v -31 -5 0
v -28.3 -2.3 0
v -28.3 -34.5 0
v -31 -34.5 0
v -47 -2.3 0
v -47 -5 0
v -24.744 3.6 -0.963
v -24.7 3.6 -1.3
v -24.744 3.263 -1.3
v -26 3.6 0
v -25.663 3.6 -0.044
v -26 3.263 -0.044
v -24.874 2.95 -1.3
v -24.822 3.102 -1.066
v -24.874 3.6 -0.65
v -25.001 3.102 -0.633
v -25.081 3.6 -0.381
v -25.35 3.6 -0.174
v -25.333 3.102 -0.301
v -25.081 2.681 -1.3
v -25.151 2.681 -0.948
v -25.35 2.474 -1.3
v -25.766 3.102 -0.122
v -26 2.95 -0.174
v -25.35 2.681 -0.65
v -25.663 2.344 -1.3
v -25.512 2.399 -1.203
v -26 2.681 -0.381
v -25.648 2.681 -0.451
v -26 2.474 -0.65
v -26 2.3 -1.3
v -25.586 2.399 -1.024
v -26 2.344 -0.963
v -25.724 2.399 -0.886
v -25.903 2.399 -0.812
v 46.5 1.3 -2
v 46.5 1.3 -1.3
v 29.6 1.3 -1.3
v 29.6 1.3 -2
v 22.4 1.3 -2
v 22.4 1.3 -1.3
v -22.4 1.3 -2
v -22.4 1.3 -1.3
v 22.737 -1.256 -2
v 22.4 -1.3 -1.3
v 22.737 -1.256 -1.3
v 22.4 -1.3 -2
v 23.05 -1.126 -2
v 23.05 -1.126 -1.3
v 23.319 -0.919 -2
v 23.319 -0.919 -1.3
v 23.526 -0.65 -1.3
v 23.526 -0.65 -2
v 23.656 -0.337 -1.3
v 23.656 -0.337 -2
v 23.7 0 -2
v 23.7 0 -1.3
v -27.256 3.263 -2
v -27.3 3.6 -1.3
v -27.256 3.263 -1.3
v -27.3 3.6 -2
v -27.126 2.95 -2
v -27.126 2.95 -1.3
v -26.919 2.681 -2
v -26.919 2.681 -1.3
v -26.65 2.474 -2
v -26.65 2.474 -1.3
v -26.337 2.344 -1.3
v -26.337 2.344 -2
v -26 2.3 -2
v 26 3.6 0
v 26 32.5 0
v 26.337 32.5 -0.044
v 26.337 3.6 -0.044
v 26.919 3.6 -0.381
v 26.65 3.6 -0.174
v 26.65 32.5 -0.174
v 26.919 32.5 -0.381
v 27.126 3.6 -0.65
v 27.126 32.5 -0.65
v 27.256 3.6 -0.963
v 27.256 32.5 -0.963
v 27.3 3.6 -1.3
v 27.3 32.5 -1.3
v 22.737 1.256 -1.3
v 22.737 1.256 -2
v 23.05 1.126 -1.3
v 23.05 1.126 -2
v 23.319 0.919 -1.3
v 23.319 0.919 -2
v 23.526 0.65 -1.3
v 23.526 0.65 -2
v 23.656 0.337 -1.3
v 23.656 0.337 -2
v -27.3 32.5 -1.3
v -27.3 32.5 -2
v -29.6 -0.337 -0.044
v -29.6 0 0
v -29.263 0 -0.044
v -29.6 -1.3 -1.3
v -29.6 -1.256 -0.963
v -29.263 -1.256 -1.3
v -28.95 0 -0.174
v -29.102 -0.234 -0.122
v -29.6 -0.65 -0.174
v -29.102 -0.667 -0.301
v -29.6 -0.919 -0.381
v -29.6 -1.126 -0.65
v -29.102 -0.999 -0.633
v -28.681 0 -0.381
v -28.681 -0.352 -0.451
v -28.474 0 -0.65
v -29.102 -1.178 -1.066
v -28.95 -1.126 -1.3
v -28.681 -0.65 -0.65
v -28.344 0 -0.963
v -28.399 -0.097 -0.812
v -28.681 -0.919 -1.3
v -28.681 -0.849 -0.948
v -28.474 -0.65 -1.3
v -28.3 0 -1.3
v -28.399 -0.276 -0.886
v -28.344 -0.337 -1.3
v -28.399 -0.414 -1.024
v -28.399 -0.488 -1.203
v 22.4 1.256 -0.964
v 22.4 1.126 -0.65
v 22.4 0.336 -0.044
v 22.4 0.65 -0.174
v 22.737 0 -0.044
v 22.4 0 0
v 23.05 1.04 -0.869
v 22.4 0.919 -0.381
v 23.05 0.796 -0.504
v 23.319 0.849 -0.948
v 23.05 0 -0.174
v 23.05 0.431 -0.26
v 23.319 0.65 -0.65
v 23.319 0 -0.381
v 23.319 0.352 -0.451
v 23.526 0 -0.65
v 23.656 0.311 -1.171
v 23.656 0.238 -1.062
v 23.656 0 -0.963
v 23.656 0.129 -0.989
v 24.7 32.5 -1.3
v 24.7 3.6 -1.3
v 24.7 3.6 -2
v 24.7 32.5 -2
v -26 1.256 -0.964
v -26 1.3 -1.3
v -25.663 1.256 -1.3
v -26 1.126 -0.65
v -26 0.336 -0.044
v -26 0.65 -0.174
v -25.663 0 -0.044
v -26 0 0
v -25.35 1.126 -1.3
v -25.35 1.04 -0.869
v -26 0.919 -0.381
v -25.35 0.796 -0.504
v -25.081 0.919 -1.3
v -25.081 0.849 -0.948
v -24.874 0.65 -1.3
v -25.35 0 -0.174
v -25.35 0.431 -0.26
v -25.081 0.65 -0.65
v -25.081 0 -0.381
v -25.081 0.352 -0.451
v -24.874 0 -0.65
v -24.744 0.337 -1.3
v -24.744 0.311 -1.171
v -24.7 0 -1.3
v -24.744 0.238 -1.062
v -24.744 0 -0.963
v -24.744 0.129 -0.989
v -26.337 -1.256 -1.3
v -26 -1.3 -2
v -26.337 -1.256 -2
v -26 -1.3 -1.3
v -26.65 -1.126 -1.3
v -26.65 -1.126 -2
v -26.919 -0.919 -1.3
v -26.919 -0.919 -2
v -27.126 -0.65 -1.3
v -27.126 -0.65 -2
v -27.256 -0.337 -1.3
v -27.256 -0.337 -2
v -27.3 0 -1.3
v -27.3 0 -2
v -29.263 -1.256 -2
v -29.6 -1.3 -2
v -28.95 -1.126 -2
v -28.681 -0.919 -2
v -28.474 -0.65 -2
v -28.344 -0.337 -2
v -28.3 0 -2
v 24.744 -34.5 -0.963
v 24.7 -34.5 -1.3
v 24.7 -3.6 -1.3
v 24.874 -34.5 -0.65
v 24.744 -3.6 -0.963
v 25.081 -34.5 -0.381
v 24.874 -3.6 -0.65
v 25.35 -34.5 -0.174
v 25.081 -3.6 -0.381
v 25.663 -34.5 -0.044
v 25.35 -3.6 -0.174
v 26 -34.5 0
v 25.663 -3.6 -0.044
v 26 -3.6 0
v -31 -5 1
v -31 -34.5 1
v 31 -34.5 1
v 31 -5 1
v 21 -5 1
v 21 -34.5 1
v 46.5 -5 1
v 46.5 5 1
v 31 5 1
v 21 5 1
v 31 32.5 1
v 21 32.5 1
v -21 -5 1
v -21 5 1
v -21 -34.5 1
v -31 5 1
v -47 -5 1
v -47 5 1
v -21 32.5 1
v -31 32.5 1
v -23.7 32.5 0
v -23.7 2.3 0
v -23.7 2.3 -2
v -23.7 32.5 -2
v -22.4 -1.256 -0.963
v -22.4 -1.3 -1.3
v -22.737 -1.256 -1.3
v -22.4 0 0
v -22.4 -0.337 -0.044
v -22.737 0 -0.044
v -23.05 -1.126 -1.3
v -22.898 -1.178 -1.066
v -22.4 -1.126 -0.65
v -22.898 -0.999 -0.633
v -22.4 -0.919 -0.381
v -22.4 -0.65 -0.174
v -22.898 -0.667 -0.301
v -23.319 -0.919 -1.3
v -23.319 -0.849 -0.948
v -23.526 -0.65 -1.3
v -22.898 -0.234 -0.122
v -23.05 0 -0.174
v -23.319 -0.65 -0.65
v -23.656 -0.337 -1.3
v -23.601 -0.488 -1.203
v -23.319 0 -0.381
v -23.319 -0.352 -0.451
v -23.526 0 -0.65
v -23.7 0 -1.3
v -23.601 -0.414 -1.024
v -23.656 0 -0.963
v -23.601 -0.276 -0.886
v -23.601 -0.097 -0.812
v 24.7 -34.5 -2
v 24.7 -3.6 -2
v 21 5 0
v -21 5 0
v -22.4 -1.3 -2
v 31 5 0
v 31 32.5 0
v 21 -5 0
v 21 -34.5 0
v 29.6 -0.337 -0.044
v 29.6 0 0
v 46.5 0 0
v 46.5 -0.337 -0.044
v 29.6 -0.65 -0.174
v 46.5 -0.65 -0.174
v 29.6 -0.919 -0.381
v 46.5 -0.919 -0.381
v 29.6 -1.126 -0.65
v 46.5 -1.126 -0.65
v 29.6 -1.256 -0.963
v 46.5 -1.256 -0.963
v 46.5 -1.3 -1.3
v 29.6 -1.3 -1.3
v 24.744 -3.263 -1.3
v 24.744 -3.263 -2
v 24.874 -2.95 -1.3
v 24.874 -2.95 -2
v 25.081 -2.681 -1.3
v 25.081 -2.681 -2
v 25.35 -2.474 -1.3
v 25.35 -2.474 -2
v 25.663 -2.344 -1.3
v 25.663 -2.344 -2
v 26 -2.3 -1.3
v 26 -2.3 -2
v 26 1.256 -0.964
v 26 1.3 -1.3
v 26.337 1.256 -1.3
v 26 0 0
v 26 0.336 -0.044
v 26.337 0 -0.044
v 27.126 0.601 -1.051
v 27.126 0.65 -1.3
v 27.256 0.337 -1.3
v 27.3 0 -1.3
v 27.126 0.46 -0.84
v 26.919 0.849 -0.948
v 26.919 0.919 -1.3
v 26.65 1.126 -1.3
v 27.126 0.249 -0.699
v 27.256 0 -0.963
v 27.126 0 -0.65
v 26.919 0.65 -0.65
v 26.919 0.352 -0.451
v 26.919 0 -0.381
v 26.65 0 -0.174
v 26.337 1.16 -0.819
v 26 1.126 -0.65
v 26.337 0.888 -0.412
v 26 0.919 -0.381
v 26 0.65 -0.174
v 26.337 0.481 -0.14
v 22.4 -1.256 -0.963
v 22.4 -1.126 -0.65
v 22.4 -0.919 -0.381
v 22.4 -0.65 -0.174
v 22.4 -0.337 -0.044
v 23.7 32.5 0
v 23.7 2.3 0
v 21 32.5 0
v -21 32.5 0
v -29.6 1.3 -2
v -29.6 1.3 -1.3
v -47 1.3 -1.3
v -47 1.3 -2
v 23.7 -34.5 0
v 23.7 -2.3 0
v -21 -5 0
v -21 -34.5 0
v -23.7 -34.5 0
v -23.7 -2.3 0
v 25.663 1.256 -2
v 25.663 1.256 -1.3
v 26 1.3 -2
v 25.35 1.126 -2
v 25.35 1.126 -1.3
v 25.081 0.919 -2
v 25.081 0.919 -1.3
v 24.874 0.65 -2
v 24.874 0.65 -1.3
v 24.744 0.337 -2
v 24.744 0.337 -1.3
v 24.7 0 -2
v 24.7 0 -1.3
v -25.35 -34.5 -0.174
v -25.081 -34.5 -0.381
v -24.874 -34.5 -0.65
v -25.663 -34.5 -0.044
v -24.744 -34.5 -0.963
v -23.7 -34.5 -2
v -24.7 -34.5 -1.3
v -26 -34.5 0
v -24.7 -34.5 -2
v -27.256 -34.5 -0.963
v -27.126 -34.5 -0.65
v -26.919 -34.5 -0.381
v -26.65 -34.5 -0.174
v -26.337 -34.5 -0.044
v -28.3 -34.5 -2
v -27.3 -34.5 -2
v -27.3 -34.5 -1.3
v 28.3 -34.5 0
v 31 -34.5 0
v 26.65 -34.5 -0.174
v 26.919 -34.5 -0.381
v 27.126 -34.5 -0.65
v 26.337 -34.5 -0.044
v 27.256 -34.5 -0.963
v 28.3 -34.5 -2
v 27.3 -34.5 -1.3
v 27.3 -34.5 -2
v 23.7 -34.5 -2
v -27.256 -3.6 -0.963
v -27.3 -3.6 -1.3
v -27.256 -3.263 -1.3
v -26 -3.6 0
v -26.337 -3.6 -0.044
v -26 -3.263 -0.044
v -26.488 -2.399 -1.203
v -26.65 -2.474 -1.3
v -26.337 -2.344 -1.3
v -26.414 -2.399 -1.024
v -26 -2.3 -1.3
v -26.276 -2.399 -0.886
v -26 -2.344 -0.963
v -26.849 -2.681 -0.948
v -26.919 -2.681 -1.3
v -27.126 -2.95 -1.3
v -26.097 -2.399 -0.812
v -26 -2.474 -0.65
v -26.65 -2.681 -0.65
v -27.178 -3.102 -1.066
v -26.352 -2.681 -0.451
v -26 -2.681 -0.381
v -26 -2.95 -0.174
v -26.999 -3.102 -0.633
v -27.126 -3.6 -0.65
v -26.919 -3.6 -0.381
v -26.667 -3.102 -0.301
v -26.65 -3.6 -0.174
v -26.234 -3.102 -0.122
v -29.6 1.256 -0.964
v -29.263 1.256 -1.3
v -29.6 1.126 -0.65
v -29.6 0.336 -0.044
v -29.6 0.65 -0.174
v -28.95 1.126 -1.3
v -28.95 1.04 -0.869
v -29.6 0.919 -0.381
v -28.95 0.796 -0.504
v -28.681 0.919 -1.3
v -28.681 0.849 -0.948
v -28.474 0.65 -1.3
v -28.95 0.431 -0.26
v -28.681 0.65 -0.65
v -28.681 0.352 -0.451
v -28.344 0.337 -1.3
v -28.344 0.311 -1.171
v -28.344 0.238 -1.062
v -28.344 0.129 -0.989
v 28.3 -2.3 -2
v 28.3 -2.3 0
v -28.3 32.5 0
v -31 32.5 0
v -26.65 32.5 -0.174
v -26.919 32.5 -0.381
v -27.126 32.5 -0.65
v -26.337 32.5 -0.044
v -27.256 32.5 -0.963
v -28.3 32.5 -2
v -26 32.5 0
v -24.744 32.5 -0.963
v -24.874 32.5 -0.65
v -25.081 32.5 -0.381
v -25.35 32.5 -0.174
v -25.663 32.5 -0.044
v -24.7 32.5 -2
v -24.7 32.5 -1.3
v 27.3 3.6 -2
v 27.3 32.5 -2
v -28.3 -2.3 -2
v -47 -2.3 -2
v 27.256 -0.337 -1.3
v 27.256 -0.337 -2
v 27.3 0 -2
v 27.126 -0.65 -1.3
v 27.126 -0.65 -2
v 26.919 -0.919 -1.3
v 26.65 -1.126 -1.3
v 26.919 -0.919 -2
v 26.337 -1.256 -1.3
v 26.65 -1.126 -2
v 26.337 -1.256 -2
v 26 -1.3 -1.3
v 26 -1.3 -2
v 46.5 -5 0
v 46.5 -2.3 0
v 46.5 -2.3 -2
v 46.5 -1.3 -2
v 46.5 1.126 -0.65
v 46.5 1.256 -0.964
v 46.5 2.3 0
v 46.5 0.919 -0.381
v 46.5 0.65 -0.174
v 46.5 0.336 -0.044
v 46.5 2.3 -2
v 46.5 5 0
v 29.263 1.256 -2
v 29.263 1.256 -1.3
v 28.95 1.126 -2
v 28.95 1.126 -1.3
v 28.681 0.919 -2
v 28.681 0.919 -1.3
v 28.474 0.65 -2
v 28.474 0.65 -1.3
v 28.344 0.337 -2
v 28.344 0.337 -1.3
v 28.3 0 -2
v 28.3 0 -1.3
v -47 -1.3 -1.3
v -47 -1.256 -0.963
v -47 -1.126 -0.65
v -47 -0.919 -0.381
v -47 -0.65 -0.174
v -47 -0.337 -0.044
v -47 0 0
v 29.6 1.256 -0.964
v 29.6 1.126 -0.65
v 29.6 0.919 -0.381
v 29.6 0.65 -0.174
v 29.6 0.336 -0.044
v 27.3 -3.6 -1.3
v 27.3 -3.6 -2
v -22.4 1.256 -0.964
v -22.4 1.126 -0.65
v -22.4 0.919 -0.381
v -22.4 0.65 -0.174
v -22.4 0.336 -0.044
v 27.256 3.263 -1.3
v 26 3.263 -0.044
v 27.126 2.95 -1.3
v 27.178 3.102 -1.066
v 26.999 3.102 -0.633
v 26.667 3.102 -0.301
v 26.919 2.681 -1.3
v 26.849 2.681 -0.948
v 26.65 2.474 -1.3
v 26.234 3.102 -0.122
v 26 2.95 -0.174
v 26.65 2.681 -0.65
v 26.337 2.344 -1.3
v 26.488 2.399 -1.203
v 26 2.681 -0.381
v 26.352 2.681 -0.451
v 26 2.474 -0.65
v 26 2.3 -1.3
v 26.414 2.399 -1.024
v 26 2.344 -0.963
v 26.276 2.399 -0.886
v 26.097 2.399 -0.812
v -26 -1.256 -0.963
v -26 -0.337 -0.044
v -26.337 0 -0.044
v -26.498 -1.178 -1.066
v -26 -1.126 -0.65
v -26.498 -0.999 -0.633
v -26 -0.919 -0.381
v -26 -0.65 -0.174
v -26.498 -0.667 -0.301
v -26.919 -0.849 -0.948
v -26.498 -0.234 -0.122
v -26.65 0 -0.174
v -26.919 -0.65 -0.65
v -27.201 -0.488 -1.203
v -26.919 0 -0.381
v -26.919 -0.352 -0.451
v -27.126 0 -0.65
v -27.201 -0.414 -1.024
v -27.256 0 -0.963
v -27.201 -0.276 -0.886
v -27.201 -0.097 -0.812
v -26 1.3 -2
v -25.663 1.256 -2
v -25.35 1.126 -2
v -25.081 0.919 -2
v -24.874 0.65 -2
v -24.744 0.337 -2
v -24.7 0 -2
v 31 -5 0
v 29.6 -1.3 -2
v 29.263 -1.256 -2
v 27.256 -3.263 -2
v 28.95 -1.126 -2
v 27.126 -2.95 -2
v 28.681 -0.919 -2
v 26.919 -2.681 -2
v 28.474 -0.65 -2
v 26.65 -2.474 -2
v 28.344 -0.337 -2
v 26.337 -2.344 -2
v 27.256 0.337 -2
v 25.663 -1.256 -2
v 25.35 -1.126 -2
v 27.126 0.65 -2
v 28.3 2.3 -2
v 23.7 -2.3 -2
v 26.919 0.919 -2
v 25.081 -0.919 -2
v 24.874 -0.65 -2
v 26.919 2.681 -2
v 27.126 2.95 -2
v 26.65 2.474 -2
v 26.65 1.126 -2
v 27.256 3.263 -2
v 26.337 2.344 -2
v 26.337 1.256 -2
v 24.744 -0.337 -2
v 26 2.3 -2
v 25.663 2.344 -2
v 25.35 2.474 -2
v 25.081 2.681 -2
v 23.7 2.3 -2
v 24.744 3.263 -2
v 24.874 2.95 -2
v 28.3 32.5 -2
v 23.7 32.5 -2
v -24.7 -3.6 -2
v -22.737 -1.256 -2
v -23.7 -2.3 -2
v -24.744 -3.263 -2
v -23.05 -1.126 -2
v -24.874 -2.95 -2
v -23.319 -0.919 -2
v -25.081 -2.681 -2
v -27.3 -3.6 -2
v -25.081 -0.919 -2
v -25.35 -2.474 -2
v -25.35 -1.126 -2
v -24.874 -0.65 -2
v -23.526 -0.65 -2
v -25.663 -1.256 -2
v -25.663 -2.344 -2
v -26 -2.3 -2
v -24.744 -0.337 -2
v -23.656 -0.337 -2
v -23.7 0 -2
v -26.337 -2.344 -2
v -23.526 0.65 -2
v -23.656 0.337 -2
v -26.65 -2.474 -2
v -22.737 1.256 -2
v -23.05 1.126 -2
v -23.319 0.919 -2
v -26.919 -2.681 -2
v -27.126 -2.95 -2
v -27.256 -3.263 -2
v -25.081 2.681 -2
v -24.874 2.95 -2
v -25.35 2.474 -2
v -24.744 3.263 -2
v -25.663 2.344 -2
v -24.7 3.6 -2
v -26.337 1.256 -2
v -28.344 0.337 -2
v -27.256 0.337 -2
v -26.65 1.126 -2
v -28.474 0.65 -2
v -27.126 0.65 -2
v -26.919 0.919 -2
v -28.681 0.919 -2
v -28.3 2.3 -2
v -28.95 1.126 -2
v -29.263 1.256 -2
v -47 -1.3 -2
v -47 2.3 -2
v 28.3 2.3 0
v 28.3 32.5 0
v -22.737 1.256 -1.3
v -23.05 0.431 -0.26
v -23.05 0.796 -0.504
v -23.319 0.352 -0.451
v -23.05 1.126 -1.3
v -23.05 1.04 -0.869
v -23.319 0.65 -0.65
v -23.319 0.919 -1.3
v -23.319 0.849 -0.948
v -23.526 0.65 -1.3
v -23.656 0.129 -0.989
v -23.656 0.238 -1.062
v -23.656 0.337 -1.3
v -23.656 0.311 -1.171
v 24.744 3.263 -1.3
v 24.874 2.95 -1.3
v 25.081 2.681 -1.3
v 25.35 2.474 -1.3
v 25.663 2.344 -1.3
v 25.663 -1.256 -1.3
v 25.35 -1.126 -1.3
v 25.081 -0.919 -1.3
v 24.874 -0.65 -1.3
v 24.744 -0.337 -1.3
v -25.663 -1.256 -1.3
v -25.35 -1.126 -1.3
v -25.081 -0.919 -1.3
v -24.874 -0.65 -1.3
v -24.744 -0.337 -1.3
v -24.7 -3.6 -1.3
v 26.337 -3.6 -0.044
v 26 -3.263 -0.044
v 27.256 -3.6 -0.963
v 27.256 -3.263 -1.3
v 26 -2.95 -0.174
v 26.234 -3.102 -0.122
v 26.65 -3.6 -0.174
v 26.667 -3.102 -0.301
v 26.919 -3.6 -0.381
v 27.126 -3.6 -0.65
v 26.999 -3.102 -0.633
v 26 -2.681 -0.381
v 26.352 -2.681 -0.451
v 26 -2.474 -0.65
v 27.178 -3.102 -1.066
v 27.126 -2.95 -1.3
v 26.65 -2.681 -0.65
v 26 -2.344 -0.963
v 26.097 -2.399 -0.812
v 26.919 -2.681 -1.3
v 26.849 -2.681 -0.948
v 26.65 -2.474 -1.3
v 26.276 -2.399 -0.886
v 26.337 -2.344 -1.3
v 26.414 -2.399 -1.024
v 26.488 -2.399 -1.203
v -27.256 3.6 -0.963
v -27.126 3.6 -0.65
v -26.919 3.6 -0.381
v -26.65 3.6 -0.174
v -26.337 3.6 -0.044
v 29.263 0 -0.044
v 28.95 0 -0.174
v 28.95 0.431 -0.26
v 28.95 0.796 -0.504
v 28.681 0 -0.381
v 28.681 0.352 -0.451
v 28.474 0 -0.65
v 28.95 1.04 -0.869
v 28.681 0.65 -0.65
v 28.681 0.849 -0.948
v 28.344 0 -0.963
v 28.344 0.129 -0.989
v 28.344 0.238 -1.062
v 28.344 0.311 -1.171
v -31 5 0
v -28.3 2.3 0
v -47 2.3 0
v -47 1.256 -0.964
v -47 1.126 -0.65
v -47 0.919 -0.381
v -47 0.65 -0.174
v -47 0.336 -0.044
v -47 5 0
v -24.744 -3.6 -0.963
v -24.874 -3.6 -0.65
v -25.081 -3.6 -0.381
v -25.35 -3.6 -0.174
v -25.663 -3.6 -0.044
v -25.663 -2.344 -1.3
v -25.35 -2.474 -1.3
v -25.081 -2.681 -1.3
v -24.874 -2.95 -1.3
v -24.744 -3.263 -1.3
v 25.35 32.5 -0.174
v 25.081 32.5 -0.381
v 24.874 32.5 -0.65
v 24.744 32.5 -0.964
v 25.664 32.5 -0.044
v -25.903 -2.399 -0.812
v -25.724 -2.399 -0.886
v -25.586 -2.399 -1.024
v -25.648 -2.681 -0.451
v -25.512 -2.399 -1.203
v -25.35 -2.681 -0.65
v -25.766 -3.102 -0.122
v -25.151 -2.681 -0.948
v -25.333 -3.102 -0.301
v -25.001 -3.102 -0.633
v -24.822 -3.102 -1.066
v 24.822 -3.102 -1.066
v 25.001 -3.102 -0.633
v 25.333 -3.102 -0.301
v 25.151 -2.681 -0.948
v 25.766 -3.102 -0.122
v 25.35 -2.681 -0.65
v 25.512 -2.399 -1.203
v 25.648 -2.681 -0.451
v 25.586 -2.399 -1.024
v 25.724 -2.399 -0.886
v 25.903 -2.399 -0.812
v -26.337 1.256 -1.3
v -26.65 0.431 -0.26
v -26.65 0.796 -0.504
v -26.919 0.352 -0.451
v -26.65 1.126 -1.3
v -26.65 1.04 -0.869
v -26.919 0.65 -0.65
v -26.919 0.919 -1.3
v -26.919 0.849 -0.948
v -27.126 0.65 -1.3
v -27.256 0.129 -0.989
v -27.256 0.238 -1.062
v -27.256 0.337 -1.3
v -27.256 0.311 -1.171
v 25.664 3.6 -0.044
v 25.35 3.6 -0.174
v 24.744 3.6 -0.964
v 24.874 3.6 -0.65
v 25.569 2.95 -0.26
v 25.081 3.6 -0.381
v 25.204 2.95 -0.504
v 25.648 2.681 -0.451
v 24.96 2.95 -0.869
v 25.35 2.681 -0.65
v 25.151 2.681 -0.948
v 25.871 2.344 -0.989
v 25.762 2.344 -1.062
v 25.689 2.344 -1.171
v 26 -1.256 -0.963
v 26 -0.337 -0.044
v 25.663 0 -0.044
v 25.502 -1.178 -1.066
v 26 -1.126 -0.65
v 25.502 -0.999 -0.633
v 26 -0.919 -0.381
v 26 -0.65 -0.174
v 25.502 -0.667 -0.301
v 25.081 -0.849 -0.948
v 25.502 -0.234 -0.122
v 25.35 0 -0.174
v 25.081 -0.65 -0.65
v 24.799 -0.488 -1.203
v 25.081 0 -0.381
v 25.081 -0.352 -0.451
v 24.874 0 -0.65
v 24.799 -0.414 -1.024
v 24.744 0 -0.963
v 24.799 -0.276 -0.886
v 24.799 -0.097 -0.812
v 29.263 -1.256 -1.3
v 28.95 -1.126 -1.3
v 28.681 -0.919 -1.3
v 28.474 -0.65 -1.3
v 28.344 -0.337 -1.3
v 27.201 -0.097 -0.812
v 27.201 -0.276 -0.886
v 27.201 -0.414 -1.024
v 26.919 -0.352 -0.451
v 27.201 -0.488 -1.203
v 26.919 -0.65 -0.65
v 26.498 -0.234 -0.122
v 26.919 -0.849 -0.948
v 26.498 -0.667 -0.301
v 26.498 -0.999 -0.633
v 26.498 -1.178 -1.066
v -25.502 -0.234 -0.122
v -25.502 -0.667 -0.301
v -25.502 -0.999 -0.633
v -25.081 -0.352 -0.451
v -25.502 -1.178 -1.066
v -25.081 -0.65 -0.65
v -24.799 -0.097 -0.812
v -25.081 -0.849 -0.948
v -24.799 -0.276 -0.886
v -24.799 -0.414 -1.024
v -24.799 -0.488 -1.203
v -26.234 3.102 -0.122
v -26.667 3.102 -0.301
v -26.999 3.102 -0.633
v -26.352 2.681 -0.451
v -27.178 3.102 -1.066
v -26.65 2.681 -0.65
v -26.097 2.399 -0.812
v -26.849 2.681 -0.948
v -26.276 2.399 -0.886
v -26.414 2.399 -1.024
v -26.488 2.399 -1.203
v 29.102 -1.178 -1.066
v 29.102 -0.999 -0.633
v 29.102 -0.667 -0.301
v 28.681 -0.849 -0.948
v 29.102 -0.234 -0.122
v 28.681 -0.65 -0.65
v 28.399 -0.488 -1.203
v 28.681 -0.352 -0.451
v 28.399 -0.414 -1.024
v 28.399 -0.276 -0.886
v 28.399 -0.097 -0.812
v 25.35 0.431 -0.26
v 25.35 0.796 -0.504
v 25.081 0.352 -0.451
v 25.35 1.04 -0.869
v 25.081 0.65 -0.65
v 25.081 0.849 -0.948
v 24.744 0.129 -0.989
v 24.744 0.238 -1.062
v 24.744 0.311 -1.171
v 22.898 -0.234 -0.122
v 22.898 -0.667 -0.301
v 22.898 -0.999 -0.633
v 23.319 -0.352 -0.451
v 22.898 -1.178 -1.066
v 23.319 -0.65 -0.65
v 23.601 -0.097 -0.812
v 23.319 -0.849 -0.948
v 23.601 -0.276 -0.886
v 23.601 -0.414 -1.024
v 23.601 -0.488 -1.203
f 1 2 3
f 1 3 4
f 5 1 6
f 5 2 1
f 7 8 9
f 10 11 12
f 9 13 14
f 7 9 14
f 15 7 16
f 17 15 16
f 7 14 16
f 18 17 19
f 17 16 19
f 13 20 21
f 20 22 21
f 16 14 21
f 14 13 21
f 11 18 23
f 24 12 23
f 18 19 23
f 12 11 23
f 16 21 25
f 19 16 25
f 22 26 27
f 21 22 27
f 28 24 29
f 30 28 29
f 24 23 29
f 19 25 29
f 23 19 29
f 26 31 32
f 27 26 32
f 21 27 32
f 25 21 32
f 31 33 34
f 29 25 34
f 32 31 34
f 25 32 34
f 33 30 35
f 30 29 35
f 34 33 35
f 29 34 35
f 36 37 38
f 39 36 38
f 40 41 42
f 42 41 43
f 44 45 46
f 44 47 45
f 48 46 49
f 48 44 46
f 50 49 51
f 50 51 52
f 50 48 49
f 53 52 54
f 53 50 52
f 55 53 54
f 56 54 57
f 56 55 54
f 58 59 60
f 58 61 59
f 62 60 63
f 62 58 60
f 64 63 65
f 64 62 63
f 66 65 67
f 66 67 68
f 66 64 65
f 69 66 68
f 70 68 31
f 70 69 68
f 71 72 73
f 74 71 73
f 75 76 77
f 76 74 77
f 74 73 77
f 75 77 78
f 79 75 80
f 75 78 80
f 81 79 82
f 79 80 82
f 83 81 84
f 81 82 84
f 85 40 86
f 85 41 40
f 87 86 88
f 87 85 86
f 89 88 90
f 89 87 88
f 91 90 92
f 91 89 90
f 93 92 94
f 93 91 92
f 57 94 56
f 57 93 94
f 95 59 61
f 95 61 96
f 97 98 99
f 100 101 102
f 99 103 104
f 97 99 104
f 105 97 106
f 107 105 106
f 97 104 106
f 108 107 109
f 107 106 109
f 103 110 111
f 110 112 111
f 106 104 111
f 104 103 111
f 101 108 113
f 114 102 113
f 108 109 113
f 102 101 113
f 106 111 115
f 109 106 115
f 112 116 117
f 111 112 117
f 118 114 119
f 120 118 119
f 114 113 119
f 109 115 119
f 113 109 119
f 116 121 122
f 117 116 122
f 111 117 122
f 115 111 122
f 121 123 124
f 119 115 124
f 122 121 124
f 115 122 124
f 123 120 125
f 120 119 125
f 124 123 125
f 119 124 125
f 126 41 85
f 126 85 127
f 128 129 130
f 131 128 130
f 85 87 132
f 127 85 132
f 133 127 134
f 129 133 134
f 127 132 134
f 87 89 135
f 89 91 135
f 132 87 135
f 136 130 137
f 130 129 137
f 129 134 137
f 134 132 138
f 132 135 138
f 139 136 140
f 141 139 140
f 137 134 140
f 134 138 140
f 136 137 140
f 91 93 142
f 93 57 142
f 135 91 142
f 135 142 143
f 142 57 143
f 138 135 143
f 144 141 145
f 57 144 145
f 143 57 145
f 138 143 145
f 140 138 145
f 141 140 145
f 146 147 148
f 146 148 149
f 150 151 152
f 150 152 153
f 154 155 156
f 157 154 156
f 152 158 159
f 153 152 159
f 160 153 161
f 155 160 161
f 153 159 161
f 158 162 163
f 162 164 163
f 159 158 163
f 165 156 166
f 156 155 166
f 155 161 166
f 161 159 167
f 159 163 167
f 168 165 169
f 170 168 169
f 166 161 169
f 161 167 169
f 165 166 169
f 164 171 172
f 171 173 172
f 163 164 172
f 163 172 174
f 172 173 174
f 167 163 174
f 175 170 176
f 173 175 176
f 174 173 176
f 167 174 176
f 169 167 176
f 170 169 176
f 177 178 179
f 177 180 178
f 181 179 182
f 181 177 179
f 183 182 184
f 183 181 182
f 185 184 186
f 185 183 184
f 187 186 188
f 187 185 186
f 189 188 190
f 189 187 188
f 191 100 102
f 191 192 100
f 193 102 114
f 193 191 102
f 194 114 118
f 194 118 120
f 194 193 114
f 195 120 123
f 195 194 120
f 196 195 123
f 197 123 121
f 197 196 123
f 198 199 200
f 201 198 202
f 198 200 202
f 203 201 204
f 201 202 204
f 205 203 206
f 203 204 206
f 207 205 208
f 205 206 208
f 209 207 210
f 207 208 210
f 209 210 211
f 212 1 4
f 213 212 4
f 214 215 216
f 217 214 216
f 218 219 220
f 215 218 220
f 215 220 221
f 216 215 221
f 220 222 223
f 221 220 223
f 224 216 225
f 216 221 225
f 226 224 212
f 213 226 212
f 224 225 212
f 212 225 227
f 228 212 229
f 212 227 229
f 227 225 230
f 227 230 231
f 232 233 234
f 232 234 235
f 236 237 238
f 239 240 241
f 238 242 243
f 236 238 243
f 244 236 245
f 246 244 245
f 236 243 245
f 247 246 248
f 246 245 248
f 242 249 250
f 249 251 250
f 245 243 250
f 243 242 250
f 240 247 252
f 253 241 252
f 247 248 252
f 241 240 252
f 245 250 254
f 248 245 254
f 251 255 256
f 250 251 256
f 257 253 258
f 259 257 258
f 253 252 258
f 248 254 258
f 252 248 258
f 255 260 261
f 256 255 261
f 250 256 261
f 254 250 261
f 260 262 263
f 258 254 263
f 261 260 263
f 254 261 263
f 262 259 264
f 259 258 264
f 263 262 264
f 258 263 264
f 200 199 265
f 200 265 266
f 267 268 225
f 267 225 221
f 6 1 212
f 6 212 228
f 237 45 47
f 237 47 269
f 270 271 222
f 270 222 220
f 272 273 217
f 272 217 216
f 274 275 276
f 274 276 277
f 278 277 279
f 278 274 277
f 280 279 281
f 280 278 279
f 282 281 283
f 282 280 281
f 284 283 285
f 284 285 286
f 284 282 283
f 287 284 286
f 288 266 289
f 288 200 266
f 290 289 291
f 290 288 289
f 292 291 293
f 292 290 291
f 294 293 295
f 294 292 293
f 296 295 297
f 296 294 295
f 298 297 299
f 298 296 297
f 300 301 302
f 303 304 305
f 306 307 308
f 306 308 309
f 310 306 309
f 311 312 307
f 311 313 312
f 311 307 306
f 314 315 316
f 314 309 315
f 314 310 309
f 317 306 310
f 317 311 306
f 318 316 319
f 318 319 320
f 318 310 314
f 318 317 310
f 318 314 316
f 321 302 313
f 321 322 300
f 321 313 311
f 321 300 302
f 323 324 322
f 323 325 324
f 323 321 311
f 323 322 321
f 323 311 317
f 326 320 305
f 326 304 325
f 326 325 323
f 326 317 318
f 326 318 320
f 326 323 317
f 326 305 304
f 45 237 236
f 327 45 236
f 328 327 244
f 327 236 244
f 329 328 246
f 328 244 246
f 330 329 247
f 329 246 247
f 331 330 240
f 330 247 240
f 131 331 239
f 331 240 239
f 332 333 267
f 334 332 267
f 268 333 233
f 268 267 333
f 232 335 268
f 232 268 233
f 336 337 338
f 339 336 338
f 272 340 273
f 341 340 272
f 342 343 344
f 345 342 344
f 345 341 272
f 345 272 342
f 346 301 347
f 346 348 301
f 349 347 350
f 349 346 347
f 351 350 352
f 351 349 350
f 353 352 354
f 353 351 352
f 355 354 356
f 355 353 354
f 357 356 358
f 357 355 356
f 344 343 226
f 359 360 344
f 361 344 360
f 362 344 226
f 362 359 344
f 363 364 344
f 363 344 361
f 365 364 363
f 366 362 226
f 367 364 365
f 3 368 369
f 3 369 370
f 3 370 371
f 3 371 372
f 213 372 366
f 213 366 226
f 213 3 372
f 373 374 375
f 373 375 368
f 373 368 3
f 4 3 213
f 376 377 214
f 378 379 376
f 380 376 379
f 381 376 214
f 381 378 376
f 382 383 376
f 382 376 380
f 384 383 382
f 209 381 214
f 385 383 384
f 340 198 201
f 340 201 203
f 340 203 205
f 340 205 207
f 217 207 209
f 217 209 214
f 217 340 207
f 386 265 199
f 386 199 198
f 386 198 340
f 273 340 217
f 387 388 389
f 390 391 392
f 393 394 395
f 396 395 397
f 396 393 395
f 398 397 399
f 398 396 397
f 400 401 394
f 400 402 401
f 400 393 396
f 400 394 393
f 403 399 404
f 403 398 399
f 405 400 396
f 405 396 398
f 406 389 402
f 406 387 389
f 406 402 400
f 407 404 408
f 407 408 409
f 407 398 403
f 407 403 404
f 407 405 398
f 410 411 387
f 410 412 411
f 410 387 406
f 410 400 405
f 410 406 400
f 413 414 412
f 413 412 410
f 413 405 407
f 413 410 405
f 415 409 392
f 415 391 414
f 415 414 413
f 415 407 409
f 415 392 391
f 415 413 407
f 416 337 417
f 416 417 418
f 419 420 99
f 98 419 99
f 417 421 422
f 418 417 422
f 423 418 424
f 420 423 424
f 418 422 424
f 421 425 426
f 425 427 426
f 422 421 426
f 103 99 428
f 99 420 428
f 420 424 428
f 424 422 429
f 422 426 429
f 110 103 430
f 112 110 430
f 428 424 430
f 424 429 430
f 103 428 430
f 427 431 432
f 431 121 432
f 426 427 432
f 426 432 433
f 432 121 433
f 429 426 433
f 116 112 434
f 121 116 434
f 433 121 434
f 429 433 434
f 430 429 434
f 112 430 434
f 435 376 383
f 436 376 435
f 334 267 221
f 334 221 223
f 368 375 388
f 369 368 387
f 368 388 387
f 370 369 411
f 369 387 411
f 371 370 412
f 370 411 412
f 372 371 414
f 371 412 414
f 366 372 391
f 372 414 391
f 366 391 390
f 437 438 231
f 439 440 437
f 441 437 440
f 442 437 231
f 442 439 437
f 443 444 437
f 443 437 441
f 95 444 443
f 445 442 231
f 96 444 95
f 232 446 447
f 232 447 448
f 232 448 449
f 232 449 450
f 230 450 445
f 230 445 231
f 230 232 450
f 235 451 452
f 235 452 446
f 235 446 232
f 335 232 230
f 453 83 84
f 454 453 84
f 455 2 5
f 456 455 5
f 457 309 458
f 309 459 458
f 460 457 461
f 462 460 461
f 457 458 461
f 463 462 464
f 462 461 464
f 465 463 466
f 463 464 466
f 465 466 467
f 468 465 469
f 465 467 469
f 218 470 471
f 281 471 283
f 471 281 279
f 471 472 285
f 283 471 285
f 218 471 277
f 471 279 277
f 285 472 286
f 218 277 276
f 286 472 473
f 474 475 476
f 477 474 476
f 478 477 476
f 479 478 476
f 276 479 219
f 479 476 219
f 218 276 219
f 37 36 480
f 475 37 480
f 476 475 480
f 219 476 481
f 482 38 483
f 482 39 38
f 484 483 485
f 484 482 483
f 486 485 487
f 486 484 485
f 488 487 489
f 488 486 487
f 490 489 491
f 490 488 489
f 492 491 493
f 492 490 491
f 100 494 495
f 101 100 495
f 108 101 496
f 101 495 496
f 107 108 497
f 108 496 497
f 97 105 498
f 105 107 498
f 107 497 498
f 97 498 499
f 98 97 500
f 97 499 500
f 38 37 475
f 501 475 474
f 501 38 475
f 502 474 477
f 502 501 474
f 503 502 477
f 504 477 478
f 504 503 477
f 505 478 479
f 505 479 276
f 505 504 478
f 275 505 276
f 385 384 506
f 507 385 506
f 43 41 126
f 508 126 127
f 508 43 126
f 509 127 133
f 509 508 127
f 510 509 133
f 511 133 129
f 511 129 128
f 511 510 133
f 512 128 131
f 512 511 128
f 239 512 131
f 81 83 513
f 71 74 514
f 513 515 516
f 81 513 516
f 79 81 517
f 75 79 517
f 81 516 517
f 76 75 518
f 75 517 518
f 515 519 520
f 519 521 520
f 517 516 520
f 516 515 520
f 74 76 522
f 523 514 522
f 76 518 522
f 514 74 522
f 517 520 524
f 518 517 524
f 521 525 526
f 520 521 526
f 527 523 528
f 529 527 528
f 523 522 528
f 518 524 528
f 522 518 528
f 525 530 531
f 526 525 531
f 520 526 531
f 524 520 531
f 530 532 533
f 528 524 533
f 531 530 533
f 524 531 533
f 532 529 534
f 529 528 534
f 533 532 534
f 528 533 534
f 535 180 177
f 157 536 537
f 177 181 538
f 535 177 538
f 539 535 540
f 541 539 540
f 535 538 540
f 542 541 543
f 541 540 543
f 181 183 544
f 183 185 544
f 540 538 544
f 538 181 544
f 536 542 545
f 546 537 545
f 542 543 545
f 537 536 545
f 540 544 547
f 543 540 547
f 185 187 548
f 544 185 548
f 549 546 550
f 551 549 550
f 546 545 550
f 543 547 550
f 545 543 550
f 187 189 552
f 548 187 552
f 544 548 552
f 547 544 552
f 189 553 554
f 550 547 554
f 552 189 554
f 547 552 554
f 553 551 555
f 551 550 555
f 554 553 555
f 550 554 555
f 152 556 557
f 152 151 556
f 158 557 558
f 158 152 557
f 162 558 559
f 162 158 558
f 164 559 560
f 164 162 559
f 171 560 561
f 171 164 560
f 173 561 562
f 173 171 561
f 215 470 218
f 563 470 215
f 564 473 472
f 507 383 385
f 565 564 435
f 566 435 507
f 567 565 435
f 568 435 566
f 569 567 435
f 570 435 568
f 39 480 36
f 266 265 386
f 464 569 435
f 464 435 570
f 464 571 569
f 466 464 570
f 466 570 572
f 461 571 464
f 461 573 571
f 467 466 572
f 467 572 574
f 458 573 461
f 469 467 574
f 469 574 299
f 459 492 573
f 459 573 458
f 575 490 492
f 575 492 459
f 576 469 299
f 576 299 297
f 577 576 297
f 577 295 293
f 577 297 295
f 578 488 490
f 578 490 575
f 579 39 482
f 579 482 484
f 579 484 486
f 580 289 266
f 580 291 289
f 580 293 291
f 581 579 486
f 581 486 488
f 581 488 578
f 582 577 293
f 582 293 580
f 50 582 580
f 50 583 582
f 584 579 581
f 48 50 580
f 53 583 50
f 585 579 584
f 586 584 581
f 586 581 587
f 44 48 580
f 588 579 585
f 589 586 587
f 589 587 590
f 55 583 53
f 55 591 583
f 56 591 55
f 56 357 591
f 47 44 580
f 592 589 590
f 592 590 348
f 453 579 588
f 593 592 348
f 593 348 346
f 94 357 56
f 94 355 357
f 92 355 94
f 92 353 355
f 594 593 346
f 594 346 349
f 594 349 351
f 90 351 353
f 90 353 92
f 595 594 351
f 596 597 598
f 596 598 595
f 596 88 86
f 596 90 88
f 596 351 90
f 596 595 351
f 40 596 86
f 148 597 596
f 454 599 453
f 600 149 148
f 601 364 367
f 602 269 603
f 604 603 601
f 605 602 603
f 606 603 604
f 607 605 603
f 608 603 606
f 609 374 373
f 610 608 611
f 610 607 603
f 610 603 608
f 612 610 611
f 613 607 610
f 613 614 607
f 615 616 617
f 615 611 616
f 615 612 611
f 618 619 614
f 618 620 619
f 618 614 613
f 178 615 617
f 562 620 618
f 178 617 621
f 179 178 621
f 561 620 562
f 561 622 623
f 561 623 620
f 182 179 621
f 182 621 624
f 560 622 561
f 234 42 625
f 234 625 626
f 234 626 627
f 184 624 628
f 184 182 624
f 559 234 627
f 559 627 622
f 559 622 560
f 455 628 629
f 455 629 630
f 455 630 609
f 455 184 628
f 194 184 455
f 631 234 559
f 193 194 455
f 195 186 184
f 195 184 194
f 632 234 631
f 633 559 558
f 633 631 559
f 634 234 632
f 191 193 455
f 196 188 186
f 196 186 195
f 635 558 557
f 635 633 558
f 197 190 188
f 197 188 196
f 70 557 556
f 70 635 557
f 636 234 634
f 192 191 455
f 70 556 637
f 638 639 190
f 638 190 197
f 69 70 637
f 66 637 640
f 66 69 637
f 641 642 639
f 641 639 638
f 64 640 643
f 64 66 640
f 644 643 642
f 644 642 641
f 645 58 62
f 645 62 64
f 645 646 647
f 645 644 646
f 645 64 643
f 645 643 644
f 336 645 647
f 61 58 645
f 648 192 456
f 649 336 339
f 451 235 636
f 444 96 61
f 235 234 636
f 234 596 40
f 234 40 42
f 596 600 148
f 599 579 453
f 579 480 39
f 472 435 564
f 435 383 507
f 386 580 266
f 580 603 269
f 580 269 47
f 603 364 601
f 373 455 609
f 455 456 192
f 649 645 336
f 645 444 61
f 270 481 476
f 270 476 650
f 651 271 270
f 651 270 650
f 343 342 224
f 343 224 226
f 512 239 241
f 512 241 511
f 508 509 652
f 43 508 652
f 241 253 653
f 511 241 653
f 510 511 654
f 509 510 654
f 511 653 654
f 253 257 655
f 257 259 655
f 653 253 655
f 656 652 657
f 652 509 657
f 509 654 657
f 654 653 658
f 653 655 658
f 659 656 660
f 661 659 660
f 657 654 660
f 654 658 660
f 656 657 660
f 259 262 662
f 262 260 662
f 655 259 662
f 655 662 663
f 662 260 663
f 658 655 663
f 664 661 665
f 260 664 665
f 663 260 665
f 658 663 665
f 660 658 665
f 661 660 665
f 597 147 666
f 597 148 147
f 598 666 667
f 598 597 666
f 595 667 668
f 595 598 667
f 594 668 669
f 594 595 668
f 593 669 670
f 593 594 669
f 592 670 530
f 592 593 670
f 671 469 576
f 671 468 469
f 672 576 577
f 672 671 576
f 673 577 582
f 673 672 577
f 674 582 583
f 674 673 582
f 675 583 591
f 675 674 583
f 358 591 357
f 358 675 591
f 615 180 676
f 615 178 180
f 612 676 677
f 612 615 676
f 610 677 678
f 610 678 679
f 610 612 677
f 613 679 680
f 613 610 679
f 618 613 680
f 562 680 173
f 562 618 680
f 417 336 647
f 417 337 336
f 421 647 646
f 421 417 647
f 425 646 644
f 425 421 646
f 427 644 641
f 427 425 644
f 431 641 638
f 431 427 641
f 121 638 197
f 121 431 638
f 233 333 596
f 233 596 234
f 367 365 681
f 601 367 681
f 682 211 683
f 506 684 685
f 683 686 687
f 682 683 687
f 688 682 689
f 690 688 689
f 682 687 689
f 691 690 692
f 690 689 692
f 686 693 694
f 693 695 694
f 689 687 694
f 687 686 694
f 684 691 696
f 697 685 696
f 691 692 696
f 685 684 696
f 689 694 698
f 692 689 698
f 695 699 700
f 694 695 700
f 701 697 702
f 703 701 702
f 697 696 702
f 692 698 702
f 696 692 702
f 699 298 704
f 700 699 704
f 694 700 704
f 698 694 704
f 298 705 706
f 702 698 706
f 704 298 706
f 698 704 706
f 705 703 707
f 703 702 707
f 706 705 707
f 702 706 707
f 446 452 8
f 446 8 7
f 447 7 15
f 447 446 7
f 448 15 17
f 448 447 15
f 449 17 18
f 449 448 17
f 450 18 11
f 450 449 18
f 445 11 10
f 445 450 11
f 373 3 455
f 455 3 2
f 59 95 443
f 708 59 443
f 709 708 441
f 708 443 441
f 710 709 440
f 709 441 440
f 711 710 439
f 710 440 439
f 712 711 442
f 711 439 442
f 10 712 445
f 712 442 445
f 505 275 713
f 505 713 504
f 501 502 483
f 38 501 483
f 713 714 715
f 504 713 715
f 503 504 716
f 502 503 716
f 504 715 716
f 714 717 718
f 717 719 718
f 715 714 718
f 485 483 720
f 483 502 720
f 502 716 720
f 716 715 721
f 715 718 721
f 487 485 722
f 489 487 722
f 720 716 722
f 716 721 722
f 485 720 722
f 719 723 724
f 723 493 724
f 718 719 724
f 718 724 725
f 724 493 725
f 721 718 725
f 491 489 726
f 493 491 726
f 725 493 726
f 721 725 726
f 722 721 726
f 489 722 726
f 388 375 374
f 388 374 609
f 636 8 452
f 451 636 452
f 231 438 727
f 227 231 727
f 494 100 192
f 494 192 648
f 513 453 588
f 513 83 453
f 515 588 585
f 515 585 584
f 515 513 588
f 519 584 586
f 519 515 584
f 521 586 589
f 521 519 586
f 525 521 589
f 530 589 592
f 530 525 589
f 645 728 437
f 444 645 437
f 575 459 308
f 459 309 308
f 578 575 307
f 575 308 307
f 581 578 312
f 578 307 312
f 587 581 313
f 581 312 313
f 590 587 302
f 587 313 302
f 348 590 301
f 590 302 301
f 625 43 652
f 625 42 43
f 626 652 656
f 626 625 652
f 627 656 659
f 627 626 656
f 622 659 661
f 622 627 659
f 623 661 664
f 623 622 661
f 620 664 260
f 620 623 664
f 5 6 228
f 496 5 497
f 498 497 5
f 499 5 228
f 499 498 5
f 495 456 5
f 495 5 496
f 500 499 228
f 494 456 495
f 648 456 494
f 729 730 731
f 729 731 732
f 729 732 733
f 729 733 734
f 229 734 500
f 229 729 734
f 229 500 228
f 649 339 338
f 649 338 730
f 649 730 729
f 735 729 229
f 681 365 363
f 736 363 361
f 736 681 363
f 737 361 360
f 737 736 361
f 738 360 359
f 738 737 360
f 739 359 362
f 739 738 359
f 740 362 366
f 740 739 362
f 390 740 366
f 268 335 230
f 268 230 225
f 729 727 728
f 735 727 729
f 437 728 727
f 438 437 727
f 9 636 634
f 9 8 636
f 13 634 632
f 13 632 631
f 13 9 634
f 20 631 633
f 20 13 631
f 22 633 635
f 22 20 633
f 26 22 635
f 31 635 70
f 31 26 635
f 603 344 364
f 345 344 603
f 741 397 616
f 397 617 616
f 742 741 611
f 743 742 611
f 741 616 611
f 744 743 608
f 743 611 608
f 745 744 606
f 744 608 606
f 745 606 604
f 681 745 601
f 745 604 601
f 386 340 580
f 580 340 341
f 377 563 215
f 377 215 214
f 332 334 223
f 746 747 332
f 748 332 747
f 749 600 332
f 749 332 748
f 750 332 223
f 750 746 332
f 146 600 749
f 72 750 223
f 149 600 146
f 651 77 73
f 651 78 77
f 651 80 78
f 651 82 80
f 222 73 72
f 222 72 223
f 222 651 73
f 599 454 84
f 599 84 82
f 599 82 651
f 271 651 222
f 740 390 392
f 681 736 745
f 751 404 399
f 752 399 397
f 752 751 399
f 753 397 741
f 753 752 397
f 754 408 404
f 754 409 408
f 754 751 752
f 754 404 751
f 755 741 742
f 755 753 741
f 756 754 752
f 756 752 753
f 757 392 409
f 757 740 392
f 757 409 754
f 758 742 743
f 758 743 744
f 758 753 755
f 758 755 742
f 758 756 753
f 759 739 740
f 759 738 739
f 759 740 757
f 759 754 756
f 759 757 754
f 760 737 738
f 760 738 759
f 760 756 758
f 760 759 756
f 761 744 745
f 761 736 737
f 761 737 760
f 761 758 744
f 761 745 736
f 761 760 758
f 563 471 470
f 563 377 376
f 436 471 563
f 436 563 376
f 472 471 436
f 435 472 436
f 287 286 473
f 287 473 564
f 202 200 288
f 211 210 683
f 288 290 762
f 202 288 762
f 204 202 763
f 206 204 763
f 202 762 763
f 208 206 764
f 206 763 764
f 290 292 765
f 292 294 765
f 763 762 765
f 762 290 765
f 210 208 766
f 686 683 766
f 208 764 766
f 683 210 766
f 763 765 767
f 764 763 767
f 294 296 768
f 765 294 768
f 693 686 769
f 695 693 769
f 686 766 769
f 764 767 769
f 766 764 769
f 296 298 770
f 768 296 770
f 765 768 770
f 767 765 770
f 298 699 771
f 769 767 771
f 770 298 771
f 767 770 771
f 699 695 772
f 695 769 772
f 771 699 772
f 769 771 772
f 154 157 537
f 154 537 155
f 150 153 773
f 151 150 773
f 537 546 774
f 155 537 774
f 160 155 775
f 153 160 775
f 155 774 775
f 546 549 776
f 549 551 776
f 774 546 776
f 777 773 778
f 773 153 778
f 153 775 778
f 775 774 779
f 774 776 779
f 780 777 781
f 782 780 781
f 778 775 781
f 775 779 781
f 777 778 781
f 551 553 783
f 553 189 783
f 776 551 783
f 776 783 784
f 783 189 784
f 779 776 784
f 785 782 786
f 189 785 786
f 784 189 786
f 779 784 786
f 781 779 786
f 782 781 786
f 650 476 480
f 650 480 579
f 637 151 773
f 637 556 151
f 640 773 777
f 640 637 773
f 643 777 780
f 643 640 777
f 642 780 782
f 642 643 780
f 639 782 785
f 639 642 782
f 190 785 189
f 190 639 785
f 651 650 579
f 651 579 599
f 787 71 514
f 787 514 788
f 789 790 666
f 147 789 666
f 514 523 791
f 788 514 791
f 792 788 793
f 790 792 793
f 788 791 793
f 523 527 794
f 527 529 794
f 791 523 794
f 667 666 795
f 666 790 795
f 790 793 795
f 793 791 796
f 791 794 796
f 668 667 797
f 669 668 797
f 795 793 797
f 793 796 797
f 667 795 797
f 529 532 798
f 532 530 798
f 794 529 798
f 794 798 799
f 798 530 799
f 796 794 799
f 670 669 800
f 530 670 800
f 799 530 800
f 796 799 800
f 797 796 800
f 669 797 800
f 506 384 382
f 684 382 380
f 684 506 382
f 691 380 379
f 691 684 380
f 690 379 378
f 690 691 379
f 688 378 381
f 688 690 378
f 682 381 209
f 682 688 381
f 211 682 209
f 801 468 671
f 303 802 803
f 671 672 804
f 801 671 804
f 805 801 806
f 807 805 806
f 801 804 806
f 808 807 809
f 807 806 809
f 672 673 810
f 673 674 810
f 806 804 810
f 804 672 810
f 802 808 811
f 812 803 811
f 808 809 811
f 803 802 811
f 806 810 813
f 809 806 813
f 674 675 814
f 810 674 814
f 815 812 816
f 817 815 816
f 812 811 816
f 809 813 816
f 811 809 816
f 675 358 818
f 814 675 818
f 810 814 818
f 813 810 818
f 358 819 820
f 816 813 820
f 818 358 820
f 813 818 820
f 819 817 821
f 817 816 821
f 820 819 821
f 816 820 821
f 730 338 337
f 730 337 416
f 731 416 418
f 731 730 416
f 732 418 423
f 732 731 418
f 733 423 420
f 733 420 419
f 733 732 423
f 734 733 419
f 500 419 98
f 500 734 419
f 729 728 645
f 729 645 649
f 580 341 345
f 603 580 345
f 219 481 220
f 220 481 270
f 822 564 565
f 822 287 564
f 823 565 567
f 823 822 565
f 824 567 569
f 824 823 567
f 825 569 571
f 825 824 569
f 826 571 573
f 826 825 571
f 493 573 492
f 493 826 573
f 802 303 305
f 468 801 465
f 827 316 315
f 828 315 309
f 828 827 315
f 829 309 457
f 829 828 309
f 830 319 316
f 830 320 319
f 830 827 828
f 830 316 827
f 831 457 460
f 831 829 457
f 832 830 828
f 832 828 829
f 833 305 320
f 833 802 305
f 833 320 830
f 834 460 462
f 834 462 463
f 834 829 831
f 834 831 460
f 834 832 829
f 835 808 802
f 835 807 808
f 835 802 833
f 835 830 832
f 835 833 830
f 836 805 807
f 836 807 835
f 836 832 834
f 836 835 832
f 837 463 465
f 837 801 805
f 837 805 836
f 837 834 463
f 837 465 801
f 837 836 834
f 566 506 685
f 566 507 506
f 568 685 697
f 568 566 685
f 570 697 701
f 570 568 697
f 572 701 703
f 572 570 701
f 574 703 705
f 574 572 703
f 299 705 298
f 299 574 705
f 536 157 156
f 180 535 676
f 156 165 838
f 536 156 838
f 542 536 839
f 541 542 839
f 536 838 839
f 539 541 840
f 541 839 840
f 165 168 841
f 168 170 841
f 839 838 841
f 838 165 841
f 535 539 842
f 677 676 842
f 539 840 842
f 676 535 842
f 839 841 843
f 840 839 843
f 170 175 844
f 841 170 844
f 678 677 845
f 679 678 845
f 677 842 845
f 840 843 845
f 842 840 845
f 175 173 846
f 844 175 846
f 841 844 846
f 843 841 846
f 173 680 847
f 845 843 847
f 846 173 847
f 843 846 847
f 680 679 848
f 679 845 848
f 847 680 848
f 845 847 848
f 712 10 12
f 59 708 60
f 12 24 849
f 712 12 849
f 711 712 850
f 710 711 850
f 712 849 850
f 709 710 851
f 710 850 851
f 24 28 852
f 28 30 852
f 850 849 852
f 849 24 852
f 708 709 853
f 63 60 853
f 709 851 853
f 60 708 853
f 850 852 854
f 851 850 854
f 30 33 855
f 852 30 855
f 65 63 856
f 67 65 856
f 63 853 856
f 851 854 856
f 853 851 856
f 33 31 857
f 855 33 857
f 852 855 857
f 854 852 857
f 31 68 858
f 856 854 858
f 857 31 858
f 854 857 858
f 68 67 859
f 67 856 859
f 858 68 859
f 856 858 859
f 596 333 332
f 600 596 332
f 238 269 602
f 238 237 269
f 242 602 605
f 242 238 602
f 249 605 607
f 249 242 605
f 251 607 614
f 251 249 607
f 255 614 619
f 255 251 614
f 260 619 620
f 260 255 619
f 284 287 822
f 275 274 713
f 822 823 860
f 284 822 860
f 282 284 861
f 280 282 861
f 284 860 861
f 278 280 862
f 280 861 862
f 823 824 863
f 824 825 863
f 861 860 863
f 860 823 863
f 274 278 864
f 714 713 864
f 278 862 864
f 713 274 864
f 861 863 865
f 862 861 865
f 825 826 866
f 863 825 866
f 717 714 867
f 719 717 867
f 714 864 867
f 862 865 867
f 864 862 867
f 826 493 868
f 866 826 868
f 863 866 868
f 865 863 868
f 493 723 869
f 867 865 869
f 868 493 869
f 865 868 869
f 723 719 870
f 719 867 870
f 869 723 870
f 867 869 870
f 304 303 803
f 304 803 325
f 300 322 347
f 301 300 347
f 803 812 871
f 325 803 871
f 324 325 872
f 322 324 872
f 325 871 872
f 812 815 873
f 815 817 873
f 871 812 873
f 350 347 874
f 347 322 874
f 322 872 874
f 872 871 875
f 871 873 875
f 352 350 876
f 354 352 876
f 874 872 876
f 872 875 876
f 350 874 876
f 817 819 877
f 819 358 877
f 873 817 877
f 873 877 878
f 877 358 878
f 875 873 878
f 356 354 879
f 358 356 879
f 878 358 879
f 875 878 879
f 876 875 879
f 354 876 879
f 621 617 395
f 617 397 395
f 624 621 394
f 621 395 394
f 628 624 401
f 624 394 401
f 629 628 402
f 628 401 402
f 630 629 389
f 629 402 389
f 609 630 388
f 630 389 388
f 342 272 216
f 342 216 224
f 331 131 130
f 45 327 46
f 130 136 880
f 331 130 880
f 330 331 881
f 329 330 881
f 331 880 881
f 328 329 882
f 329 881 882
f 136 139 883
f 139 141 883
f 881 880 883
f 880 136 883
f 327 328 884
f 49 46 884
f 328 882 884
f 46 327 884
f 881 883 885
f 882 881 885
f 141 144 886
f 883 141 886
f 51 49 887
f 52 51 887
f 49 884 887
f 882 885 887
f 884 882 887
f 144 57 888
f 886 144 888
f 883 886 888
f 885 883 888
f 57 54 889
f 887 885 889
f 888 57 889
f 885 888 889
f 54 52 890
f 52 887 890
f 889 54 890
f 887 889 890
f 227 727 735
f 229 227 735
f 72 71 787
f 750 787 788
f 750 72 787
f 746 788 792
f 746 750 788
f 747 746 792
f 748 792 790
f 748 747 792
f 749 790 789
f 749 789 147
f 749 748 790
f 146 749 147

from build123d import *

# Parameters (mm, degrees)
AUFSATZ_LINEAR_AUSTRAGEN1_DEPTH = 1
SKIZZE2_W                       = 16
SKIZZE2_H                       = 10
SKIZZE2_W_2                     = 15.5
AUFSATZ_LINEAR_AUSTRAGEN2_DEPTH = 1
SKIZZE4_W                       = 93.5
SKIZZE4_H                       = 1
SKIZZE4_W_2                     = 1
SKIZZE4_H_2                     = 67
AUFSATZ_LINEAR_AUSTRAGEN5_DEPTH = 2
VERRUNDUNG1_R                   = 1.3
VERRUNDUNG2_R                   = 1.3
VERRUNDUNG3_R                   = 1.3
VERRUNDUNG4_R                   = 1.3
VERRUNDUNG5_R                   = 1.3
VERRUNDUNG6_R                   = 1.3
VERRUNDUNG7_R                   = 1.3
VERRUNDUNG8_R                   = 1.3
VERRUNDUNG9_R                   = 1.3
VERRUNDUNG10_R                  = 1.3
VERRUNDUNG11_R                  = 1.3
VERRUNDUNG12_R                  = 1.3
VERRUNDUNG13_R                  = 1.3


with BuildPart() as part:
    # Skizze1 → Aufsatz-Linear austragen1 (new body)
    with BuildSketch(Plane.XY):
        Polygon((-31, -15.187500578), (-31, 32.5), (-21, 32.5), (-21, 5), (21, 5), (21, 32.5), (31, 32.5), (31, -34.5), (21, -34.5), (21, -5), (-21, -5), (-21, -34.5), (-31, -34.5), align=None)
    extrude(amount=AUFSATZ_LINEAR_AUSTRAGEN1_DEPTH)

    # Skizze2 → Aufsatz-Linear austragen2 (add)
    with BuildSketch(Plane(origin=(0, 0, 0), x_dir=(-1, 0, 0), z_dir=(0, 0, -1))):
        with Locations((39, 0)):
            Rectangle(SKIZZE2_W, SKIZZE2_H)
        with Locations((-38.75, 0)):
            Rectangle(SKIZZE2_W_2, SKIZZE2_H)
    extrude(amount=-AUFSATZ_LINEAR_AUSTRAGEN2_DEPTH)

    # Skizze4 → Aufsatz-Linear austragen5 (add)
    with BuildSketch(Plane(origin=(0, 0, 0), x_dir=(-1, 0, 0), z_dir=(0, 0, -1))):
        with Locations((0.25, 1.8)):
            Rectangle(SKIZZE4_W, SKIZZE4_H)
        with Locations((0.25, -1.8)):
            Rectangle(SKIZZE4_W, SKIZZE4_H)
        with Locations((-27.8, -1)):
            Rectangle(SKIZZE4_W_2, SKIZZE4_H_2)
        with Locations((-24.2, -1)):
            Rectangle(SKIZZE4_W_2, SKIZZE4_H_2)
        with Locations((24.2, -1)):
            Rectangle(SKIZZE4_W_2, SKIZZE4_H_2)
        with Locations((27.8, -1)):
            Rectangle(SKIZZE4_W_2, SKIZZE4_H_2)
    extrude(amount=AUFSATZ_LINEAR_AUSTRAGEN5_DEPTH)

    # Verrundung1
    verrundung1_edges = [part.edges().sort_by_distance(p)[0] for p in [
        (24.7, 17.4, 0),
    ]]
    fillet(verrundung1_edges, radius=VERRUNDUNG1_R)

    # Verrundung2
    verrundung2_edges = [part.edges().sort_by_distance(p)[0] for p in [
        (27.3, 17.4, 0),
    ]]
    fillet(verrundung2_edges, radius=VERRUNDUNG2_R - 0.0001)  # a hair under: the kernel refuses the full size

    # Verrundung3
    verrundung3_edges = [part.edges().sort_by_distance(p)[0] for p in [
        (37.4, 1.3, 0),
        (26, 1.3, 0),
        (0, 1.3, 0),
        (-26, 1.3, 0),
        (-37.65, 1.3, 0),
    ]]
    fillet(verrundung3_edges, radius=VERRUNDUNG3_R)

    # Verrundung4
    verrundung4_edges = [part.edges().sort_by_distance(p)[0] for p in [
        (37.4, -1.3, 0),
        (26, -1.3, 0),
        (0, -1.3, 0),
        (-26, -1.3, 0),
        (-37.65, -1.3, 0),
    ]]
    fillet(verrundung4_edges, radius=VERRUNDUNG4_R - 0.0001)  # a hair under: the kernel refuses the full size

    # Verrundung5
    verrundung5_edges = [part.edges().sort_by_distance(p)[0] for p in [
        (24.7, 2.3, -1.65),
        (27.3, 2.3, -1.64995),
        (26.919268105, 2.3, -0.380731895),
        (25.080761184, 2.3, -0.380761184),
    ]]
    fillet(verrundung5_edges, radius=VERRUNDUNG5_R - 0.0001)  # a hair under: the kernel refuses the full size

    # Verrundung6
    verrundung6_edges = [part.edges().sort_by_distance(p)[0] for p in [
        (24.7, 1.3, -1.65),
        (24.7, -1.3, -1.64995),
        (28.3, 1.3, -1.65),
        (28.3, -1.3, -1.64995),
        (24.7, -0.919268105, -0.380731895),
        (24.7, 0.919238816, -0.380761184),
        (28.3, 0.919238816, -0.380761184),
        (28.3, -0.919268105, -0.380731895),
    ]]
    fillet(verrundung6_edges, radius=VERRUNDUNG6_R - 0.0001)  # a hair under: the kernel refuses the full size

    # Verrundung7
    verrundung7_edges = [part.edges().sort_by_distance(p)[0] for p in [
        (23.7, -1.3, -1.64995),
        (23.7, 1.3, -1.65),
        (27.3, -1.3, -1.64995),
        (27.3, 1.3, -1.65),
        (23.7, 0.919238816, -0.380761184),
        (23.7, -0.919268105, -0.380731895),
        (27.3, -0.919268105, -0.380731895),
        (27.3, 0.919238816, -0.380761184),
    ]]
    fillet(verrundung7_edges, radius=VERRUNDUNG7_R - 0.0001)  # a hair under: the kernel refuses the full size

    # Verrundung8
    verrundung8_edges = [part.edges().sort_by_distance(p)[0] for p in [
        (27.3, -18.4, 0),
        (24.7, -18.4, 0),
    ]]
    fillet(verrundung8_edges, radius=VERRUNDUNG8_R - 0.0001)  # a hair under: the kernel refuses the full size

    # Verrundung9
    verrundung9_edges = [part.edges().sort_by_distance(p)[0] for p in [
        (27.3, -2.3, -1.64995),
        (24.7, -2.3, -1.64995),
        (25.080731895, -2.3, -0.380731895),
        (26.919268105, -2.3, -0.380731895),
    ]]
    fillet(verrundung9_edges, radius=VERRUNDUNG9_R - 0.0001)  # a hair under: the kernel refuses the full size

    # Verrundung10
    verrundung10_edges = [part.edges().sort_by_distance(p)[0] for p in [
        (-24.7, -1.3, -1.64995),
        (-24.7, -0.919268105, -0.380731895),
        (-24.7, 1.3, -1.65),
        (-28.3, -1.3, -1.64995),
        (-28.3, 1.3, -1.65),
        (-24.7, 0.919238816, -0.380761184),
        (-24.7, -18.4, 0),
        (-24.7, 17.4, 0),
        (-28.3, -0.919268105, -0.380731895),
        (-28.3, 0.919238816, -0.380761184),
    ]]
    fillet(verrundung10_edges, radius=VERRUNDUNG10_R - 0.0001)  # a hair under: the kernel refuses the full size

    # Verrundung11
    verrundung11_edges = [part.edges().sort_by_distance(p)[0] for p in [
        (-23.7, 1.3, -1.65),
        (-23.7, -1.3, -1.64995),
        (-27.3, 1.3, -1.65),
        (-27.3, -1.3, -1.64995),
        (-27.3, -18.4, 0),
        (-23.7, -0.919268105, -0.380731895),
        (-23.7, 0.919238816, -0.380761184),
        (-27.3, -0.919268105, -0.380731895),
        (-27.3, 0.919238816, -0.380761184),
        (-27.3, 17.4, 0),
    ]]
    fillet(verrundung11_edges, radius=VERRUNDUNG11_R - 0.0001)  # a hair under: the kernel refuses the full size

    # Verrundung12
    verrundung12_edges = [part.edges().sort_by_distance(p)[0] for p in [
        (-24.7, -2.3, -1.64995),
        (-27.3, -2.3, -1.64995),
        (-25.080731895, -2.3, -0.380731895),
        (-26.919268105, -2.3, -0.380731895),
    ]]
    fillet(verrundung12_edges, radius=VERRUNDUNG12_R - 0.0001)  # a hair under: the kernel refuses the full size

    # Verrundung13
    verrundung13_edges = [part.edges().sort_by_distance(p)[0] for p in [
        (-27.3, 2.3, -1.64995),
        (-24.7, 2.3, -1.64995),
        (-25.080731895, 2.3, -0.380731895),
        (-26.919268105, 2.3, -0.380731895),
    ]]
    fillet(verrundung13_edges, radius=VERRUNDUNG13_R - 0.0001)  # a hair under: the kernel refuses the full size


solid = part.part
